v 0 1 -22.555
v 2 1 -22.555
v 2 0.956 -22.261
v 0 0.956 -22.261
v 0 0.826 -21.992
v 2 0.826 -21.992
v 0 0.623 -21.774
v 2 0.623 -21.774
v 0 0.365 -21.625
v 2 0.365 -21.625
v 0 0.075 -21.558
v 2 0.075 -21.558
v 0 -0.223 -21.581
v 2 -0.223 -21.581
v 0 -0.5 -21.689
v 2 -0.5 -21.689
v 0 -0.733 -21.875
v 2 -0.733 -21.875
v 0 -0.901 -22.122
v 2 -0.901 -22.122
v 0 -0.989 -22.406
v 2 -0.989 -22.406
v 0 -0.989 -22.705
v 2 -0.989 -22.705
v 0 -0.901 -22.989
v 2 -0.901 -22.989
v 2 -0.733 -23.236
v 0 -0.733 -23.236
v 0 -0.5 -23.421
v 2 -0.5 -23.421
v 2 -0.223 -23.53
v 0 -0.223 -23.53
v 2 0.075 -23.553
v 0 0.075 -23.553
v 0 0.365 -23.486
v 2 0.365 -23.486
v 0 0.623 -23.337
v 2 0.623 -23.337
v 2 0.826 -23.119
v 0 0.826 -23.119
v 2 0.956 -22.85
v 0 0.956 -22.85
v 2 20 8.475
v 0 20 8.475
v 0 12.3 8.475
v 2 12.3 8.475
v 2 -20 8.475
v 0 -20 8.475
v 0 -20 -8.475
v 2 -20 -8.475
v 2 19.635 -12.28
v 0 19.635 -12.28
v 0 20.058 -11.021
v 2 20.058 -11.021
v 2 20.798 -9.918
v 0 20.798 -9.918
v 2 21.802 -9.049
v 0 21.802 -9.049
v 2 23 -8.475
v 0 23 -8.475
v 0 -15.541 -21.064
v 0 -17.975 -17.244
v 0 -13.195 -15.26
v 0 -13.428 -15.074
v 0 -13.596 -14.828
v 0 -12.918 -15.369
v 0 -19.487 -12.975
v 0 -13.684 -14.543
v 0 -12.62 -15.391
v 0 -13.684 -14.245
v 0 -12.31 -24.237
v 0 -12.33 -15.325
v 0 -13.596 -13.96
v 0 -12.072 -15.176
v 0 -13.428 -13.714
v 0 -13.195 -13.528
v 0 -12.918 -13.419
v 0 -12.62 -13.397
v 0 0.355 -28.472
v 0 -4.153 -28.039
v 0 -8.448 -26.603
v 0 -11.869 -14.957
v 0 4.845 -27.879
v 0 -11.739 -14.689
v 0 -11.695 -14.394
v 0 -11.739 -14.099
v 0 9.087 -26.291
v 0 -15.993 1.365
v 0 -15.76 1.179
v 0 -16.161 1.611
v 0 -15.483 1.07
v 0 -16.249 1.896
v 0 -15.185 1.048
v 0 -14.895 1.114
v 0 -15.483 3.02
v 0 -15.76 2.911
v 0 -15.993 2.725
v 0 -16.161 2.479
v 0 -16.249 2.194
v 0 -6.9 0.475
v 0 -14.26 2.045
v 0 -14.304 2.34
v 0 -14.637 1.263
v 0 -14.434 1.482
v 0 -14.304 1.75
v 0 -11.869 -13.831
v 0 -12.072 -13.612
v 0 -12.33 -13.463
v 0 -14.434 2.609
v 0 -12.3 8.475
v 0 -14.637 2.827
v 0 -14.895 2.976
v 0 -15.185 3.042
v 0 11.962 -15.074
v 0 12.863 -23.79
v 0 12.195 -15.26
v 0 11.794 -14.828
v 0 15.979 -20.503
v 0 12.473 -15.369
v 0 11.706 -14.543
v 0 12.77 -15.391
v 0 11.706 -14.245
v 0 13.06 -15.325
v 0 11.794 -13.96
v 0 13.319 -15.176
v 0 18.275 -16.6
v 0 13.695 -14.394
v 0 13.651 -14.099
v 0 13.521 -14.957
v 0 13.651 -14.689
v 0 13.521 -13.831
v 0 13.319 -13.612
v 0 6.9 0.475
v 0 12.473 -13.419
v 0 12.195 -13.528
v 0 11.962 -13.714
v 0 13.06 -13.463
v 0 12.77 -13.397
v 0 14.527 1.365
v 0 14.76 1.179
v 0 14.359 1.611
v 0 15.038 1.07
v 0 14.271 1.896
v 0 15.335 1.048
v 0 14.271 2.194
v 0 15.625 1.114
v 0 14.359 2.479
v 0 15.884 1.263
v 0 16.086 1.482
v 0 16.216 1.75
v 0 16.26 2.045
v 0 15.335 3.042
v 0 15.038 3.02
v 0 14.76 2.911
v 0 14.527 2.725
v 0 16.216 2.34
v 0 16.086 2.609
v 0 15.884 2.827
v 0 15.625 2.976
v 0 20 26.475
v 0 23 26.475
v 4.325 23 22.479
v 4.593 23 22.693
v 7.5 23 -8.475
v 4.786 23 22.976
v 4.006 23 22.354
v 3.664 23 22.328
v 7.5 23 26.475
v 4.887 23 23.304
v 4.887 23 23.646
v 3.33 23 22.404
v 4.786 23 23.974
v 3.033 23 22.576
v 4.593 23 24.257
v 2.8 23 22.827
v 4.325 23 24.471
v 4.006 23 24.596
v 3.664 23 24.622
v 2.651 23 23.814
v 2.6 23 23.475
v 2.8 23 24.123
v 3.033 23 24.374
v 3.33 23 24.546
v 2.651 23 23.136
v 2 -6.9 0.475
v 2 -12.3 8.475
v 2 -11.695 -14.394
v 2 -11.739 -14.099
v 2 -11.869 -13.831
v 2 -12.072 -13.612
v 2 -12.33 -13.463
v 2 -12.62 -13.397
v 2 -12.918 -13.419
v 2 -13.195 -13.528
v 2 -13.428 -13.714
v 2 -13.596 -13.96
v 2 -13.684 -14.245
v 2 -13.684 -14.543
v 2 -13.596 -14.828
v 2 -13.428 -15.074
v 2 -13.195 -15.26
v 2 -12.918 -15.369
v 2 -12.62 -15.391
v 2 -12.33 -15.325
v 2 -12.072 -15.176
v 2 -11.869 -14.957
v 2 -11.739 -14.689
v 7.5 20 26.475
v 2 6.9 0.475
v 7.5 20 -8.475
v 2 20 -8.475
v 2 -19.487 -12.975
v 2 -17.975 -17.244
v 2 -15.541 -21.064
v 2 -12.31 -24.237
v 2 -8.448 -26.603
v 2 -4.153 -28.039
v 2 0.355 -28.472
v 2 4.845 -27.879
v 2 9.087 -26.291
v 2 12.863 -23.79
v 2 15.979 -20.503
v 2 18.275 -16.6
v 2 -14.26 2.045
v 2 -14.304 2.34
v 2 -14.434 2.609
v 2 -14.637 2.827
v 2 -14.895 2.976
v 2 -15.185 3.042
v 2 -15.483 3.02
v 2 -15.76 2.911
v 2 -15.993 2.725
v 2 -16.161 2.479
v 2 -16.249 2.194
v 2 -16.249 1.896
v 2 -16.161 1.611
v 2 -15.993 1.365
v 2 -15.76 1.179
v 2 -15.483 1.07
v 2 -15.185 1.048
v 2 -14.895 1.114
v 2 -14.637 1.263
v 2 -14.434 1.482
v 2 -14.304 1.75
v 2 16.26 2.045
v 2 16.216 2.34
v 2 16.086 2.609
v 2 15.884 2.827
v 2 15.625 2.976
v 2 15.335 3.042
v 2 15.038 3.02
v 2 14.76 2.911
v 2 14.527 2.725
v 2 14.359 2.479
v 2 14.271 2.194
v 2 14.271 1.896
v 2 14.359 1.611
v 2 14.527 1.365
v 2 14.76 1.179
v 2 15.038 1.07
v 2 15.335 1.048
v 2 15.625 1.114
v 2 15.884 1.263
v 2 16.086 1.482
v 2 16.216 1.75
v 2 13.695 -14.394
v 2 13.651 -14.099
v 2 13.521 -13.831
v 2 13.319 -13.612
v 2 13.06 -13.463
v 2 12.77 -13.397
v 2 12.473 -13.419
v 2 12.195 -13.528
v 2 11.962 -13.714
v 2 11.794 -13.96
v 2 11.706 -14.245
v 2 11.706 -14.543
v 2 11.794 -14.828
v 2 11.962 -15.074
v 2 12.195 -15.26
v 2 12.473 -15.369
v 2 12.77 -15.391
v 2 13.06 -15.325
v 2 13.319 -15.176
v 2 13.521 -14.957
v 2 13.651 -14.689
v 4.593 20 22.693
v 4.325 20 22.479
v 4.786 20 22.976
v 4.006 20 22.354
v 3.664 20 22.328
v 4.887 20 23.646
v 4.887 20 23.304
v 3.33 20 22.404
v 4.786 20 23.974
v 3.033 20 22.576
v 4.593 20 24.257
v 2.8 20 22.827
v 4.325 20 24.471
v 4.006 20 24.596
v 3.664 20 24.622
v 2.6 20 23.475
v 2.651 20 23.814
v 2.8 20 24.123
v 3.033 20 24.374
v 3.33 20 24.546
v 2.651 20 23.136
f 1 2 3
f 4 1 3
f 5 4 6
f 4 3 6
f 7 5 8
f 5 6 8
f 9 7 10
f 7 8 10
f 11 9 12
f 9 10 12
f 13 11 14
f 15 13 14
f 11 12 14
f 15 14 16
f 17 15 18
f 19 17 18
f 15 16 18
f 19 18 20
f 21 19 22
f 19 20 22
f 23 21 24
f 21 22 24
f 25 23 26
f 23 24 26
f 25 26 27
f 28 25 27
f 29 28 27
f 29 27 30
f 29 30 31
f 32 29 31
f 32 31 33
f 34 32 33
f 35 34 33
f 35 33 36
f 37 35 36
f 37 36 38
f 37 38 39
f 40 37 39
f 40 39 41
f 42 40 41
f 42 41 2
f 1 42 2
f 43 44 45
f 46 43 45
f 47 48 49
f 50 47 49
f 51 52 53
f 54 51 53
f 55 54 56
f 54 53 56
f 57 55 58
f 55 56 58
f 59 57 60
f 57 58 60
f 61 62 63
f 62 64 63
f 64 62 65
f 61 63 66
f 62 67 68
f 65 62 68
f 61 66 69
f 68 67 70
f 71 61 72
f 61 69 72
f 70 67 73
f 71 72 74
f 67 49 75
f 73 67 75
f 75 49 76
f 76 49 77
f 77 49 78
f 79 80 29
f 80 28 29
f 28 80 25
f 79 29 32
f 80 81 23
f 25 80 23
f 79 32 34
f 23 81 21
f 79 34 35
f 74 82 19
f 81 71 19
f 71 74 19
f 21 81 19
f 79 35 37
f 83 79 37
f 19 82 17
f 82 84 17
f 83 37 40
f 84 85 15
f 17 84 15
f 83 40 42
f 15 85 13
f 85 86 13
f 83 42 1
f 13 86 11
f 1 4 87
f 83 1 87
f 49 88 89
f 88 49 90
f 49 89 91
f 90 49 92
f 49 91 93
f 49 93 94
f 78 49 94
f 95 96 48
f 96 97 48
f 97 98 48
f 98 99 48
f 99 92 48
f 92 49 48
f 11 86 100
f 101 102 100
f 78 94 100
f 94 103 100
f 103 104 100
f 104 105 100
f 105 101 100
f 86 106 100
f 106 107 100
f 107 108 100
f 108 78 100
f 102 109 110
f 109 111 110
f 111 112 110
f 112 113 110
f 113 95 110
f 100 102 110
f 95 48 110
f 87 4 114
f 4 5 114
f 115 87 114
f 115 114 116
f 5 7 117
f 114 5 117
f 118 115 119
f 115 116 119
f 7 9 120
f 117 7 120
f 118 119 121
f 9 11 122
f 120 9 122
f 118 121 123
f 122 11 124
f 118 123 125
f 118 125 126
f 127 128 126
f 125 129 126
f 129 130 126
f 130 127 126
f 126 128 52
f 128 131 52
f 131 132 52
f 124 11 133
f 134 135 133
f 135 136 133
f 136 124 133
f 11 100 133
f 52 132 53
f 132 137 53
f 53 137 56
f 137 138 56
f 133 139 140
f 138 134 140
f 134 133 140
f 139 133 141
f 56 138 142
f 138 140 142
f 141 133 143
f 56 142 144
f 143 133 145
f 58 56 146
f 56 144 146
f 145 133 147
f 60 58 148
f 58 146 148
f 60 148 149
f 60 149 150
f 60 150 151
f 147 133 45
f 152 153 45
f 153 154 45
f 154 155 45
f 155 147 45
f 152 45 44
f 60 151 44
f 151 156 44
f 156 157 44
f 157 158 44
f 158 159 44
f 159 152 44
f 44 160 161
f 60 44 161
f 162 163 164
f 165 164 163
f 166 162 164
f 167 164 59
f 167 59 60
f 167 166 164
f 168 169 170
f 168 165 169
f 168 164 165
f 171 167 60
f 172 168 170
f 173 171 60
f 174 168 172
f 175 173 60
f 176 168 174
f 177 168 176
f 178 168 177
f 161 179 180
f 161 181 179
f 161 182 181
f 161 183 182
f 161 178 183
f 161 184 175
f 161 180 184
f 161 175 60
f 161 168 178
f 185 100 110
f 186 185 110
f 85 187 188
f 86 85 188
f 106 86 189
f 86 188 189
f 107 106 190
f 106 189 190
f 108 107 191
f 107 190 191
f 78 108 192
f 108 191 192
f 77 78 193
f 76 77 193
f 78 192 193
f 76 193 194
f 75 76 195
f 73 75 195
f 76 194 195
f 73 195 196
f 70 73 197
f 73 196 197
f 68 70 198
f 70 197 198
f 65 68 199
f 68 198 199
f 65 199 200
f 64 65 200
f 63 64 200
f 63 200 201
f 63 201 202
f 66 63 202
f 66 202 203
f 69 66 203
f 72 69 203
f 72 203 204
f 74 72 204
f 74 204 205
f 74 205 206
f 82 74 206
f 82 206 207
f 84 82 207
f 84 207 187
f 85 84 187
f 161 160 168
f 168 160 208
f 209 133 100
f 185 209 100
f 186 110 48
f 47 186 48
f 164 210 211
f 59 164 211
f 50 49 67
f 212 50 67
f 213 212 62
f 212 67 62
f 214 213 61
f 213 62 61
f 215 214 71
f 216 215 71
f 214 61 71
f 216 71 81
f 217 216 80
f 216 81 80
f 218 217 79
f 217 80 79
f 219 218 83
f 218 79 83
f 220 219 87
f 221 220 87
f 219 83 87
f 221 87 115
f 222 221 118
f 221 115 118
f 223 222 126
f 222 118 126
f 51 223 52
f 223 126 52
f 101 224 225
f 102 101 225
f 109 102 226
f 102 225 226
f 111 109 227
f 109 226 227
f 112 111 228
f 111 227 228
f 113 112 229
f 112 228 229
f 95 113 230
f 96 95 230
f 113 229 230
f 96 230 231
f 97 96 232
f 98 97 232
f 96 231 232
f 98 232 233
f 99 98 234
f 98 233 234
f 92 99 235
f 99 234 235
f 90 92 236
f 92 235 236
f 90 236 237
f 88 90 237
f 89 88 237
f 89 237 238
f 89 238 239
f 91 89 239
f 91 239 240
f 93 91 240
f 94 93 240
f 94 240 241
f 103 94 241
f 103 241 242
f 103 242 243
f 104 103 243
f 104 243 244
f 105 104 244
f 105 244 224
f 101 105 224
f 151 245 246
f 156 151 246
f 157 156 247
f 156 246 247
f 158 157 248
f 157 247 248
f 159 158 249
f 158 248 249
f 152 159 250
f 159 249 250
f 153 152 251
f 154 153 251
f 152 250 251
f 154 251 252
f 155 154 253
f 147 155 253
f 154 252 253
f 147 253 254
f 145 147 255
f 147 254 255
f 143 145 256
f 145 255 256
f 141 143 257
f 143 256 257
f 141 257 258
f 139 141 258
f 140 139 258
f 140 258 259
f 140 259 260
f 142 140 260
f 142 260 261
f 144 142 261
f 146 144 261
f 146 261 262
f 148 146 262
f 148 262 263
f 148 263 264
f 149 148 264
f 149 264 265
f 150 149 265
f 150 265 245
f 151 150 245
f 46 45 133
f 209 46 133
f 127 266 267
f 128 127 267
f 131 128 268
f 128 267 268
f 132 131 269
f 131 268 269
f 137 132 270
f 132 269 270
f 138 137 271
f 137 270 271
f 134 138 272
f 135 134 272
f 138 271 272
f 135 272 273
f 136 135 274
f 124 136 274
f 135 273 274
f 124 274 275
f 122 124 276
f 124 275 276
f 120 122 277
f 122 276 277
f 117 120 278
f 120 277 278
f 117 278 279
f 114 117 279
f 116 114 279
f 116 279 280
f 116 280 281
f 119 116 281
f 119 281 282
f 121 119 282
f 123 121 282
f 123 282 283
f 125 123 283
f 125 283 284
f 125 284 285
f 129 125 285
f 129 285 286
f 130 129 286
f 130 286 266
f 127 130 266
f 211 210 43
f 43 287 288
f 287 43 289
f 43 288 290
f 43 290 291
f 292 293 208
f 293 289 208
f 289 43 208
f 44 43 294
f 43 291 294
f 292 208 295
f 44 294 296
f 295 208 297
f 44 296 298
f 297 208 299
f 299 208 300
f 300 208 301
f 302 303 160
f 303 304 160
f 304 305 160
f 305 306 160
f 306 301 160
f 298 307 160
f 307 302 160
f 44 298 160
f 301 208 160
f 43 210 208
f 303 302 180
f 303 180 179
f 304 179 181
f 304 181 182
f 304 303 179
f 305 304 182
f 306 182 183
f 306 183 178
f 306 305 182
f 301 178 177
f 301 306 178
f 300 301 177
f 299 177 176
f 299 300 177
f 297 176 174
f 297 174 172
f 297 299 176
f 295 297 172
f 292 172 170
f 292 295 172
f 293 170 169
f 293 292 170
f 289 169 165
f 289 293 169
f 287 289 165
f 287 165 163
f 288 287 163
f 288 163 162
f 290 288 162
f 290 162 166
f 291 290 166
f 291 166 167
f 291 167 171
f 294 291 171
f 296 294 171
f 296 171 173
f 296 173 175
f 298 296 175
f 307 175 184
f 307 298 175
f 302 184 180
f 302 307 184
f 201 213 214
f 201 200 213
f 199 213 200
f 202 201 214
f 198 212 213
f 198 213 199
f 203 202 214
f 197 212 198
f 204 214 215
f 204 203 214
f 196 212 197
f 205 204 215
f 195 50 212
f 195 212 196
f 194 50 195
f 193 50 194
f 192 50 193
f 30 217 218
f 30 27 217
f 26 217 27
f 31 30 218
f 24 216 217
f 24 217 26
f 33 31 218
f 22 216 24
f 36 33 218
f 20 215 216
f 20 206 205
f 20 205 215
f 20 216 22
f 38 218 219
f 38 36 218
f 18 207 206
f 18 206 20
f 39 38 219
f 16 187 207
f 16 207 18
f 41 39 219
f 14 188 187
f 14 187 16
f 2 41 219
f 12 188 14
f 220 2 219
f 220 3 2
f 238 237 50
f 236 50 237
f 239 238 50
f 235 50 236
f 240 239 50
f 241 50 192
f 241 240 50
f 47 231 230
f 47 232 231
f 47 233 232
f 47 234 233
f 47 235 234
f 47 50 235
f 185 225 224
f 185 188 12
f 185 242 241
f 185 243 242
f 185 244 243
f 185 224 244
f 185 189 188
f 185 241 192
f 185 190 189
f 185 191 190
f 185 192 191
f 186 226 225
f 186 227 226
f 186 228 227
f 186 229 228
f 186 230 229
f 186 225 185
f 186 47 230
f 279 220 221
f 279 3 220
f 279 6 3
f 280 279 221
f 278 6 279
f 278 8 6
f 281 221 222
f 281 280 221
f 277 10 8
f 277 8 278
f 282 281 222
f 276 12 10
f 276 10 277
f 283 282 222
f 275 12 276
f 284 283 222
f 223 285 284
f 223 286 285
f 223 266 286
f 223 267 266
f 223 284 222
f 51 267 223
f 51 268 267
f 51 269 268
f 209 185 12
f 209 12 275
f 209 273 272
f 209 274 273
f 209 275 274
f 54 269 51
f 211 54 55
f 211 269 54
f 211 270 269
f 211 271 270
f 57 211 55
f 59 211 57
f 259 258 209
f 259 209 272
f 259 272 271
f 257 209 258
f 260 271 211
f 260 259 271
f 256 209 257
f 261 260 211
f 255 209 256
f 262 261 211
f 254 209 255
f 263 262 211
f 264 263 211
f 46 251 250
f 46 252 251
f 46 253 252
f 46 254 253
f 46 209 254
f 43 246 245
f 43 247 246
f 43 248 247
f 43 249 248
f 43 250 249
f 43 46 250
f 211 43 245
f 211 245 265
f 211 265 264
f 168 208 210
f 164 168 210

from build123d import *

# Parameters (mm, degrees)
F1_DEPTH    = 2
F2_R        = 1
F3_DEPTH    = 25
F4_R        = 1.15
F5_DEPTH    = 3
F6_T1_DEPTH = 2


# Not quite as in the source:
# - a fillet or chamfer that OpenCascade refuses, or shapes differently, is made with other operations: its cross-section is extruded or revolved along the edge and cut away or added


with BuildPart() as f1:
    # F0 (on Right) → F1 (new body)
    with BuildSketch(Plane.YZ):
        with BuildLine():
            Line((20, -8.475), (20, 8.475))
            Line((20, 8.475), (12.3, 8.475))
            Line((12.3, 8.475), (6.9, 0.475))
            Line((6.9, 0.475), (0, 0.475))
            Line((0, 0.475), (-6.9, 0.475))
            Line((-6.9, 0.475), (-12.3, 8.475))
            Line((-12.3, 8.475), (-20, 8.475))
            Line((-20, 8.475), (-20, -8.475))
            ThreePointArc((-20, -8.475), (0, -28.475), (20, -8.475))
        make_face()
    extrude(amount=F1_DEPTH)

    # F2 (on face) → F3 (cut)
    with BuildSketch(Plane.YZ.offset(2)):
        with Locations((0, -22.5554741919)):
            Circle(F2_R)
        with Locations((-12.6950368285, -14.3941175193)):
            Circle(F2_R)
        with Locations((-15.2600342408, 2.045188332)):
            Circle(F2_R)
        with Locations((12.6950368285, -14.3941175193)):
            Circle(F2_R)
        with Locations((15.2600342408, 2.045188332)):
            Circle(F2_R)
    extrude(amount=-F3_DEPTH, mode=Mode.SUBTRACT)

    # F4 (on face) → F5 (join)
    with BuildSketch(Plane(origin=(0, 20, 0), x_dir=(-1, 0, 0), z_dir=(0, 1, 0))):
        Polygon((0, 8.475), (0, 26.475), (-7.5, 26.475), (-7.5, 8.475), (-2, -8.475), (0, -8.475), align=None)
        with Locations((-3.75, 23.475)):
            Circle(F4_R, mode=Mode.SUBTRACT)
        Polygon((-2, -8.475), (-7.5, 8.475), (-7.5, -8.475), align=None)
    extrude(amount=F5_DEPTH)

    # F6: fillet of radius 5 on 1 edges, made by hand

    # F6_s2 → F6_t1 (join)
    with BuildSketch(Plane.YZ):
        with BuildLine():
            ThreePointArc((19.6347826087, -12.2796434668), (20.7982860057, -9.9181716989), (23, -8.475))
            Line((23, -8.475), (20, -8.475))
            ThreePointArc((20, -8.475), (19.9084862832, -10.3860661718), (19.6347826087, -12.2796434668))
        make_face()
    extrude(amount=F6_T1_DEPTH)


solid = f1.part
